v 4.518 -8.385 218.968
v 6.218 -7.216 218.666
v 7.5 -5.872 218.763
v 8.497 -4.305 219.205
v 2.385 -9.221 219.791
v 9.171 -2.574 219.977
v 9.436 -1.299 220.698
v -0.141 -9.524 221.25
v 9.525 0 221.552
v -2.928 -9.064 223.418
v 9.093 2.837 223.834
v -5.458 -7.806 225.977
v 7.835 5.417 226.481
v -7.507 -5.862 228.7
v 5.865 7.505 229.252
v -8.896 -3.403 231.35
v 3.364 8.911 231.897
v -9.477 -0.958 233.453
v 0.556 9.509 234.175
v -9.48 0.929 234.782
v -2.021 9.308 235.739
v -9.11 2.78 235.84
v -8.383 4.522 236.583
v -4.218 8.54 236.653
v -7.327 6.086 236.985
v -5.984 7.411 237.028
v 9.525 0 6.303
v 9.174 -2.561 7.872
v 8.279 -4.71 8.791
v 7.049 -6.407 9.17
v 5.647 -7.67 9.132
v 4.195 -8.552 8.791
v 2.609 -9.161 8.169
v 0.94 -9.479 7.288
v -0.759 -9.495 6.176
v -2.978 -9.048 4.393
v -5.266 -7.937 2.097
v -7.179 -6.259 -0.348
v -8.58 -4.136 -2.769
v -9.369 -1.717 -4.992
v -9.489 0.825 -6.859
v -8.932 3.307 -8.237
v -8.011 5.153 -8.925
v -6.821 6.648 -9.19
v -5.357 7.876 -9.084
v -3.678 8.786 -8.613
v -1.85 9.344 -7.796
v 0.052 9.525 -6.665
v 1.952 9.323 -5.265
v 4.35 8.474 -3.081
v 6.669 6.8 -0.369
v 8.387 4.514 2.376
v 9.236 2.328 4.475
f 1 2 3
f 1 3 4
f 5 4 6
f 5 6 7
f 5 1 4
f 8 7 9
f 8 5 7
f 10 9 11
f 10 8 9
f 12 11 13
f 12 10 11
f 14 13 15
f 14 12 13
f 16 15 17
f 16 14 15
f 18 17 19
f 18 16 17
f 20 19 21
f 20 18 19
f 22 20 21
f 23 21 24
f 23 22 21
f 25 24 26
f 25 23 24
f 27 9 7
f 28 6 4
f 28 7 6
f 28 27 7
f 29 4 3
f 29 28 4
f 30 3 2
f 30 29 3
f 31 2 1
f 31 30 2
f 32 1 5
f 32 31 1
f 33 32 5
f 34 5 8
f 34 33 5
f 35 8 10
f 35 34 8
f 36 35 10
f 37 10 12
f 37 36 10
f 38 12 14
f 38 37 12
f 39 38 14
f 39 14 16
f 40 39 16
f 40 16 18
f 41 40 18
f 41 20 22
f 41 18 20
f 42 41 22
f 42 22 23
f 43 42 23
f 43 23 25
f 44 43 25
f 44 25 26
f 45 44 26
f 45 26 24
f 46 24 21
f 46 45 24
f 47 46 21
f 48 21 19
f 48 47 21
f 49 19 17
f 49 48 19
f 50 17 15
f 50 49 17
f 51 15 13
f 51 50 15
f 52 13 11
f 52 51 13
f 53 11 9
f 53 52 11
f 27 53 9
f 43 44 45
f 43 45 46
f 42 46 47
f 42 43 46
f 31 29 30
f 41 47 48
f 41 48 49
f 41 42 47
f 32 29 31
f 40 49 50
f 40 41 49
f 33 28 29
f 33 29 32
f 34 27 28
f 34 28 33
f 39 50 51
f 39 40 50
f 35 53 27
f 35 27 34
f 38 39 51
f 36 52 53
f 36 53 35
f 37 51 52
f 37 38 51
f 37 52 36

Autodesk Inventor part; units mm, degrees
ref_plane "Start Plane" through (0, 0, -13.0022) normal (0, 0, 1) x (1, 0, 0)
ref_plane "End Plane" through (0, 0, 240.8579) normal (0, 0, 1) x (1, 0, 0)
sketch "Sketch" plane through (0, 0, 0) normal (0, 0, 1) x (1, 0, 0)
  circle A0 centre (0, 0) radius 9.525
  dimension "d0" = 19.05
extrude "Body" add sketch "Sketch" along normal up to surface (253.86 mm away) from surface at -13.0022
sketch "Sketch2" plane through (0, 0, 0) normal (0, 0, 1) x (1, 0, 0)
  line L0 (0, 0) -> (10, 0)
ref_plane "Work Plane3" through (0, 0, 0) normal (0, -1, 0) x (1, 0, 0)
ref_plane "Work Plane4" through (-6.5271, 6.9371, 237.0539) normal (0.476, -0.5059, 0.7193) x (0.8682, 0.1401, -0.476)
split "Split1" plane through (-6.5271, 6.9371, 237.0539) removes the side toward (0.476, -0.5059, 0.7193)
ref_plane "Work Plane5" through (-6.5271, 6.9371, -9.1982) normal (0.476, -0.5059, -0.7193) x (0.1926, 0.8581, -0.476)
split "Split2" plane through (-6.5271, 6.9371, -9.1982) removes the side toward (0.476, -0.5059, -0.7193)
sketch "Sketch3" plane through (0, 0, 0) normal (0, -1, 0) x (1, 0, 0)
  line L0 (-2, -13.0022) -> (12, -13.0022) projected
  line L1 (-2, 240.8579) -> (12, 240.8579) projected
  dimension "d7" = 253.86
equation "\"d0\" = Diam"
equation "\"d1\" = G_L"
equation "\"Diam\" = 19.05"
equation "\"G_L\" = 246.25206"
equation "\"G_OFFSET_START\" = 13.00217"
equation "\"G_OFFSET_END\" = 13.00217"
equation "\"d4\" = -G_OFFSET_START"
equation "\"d5\" = G_OFFSET_END + B_L"
equation "\"B_L\" = 227.85569"
properties part number "ANSI/AISC Rolled Steel - 3/4-9.695, RB" material "Steel, Mild"
